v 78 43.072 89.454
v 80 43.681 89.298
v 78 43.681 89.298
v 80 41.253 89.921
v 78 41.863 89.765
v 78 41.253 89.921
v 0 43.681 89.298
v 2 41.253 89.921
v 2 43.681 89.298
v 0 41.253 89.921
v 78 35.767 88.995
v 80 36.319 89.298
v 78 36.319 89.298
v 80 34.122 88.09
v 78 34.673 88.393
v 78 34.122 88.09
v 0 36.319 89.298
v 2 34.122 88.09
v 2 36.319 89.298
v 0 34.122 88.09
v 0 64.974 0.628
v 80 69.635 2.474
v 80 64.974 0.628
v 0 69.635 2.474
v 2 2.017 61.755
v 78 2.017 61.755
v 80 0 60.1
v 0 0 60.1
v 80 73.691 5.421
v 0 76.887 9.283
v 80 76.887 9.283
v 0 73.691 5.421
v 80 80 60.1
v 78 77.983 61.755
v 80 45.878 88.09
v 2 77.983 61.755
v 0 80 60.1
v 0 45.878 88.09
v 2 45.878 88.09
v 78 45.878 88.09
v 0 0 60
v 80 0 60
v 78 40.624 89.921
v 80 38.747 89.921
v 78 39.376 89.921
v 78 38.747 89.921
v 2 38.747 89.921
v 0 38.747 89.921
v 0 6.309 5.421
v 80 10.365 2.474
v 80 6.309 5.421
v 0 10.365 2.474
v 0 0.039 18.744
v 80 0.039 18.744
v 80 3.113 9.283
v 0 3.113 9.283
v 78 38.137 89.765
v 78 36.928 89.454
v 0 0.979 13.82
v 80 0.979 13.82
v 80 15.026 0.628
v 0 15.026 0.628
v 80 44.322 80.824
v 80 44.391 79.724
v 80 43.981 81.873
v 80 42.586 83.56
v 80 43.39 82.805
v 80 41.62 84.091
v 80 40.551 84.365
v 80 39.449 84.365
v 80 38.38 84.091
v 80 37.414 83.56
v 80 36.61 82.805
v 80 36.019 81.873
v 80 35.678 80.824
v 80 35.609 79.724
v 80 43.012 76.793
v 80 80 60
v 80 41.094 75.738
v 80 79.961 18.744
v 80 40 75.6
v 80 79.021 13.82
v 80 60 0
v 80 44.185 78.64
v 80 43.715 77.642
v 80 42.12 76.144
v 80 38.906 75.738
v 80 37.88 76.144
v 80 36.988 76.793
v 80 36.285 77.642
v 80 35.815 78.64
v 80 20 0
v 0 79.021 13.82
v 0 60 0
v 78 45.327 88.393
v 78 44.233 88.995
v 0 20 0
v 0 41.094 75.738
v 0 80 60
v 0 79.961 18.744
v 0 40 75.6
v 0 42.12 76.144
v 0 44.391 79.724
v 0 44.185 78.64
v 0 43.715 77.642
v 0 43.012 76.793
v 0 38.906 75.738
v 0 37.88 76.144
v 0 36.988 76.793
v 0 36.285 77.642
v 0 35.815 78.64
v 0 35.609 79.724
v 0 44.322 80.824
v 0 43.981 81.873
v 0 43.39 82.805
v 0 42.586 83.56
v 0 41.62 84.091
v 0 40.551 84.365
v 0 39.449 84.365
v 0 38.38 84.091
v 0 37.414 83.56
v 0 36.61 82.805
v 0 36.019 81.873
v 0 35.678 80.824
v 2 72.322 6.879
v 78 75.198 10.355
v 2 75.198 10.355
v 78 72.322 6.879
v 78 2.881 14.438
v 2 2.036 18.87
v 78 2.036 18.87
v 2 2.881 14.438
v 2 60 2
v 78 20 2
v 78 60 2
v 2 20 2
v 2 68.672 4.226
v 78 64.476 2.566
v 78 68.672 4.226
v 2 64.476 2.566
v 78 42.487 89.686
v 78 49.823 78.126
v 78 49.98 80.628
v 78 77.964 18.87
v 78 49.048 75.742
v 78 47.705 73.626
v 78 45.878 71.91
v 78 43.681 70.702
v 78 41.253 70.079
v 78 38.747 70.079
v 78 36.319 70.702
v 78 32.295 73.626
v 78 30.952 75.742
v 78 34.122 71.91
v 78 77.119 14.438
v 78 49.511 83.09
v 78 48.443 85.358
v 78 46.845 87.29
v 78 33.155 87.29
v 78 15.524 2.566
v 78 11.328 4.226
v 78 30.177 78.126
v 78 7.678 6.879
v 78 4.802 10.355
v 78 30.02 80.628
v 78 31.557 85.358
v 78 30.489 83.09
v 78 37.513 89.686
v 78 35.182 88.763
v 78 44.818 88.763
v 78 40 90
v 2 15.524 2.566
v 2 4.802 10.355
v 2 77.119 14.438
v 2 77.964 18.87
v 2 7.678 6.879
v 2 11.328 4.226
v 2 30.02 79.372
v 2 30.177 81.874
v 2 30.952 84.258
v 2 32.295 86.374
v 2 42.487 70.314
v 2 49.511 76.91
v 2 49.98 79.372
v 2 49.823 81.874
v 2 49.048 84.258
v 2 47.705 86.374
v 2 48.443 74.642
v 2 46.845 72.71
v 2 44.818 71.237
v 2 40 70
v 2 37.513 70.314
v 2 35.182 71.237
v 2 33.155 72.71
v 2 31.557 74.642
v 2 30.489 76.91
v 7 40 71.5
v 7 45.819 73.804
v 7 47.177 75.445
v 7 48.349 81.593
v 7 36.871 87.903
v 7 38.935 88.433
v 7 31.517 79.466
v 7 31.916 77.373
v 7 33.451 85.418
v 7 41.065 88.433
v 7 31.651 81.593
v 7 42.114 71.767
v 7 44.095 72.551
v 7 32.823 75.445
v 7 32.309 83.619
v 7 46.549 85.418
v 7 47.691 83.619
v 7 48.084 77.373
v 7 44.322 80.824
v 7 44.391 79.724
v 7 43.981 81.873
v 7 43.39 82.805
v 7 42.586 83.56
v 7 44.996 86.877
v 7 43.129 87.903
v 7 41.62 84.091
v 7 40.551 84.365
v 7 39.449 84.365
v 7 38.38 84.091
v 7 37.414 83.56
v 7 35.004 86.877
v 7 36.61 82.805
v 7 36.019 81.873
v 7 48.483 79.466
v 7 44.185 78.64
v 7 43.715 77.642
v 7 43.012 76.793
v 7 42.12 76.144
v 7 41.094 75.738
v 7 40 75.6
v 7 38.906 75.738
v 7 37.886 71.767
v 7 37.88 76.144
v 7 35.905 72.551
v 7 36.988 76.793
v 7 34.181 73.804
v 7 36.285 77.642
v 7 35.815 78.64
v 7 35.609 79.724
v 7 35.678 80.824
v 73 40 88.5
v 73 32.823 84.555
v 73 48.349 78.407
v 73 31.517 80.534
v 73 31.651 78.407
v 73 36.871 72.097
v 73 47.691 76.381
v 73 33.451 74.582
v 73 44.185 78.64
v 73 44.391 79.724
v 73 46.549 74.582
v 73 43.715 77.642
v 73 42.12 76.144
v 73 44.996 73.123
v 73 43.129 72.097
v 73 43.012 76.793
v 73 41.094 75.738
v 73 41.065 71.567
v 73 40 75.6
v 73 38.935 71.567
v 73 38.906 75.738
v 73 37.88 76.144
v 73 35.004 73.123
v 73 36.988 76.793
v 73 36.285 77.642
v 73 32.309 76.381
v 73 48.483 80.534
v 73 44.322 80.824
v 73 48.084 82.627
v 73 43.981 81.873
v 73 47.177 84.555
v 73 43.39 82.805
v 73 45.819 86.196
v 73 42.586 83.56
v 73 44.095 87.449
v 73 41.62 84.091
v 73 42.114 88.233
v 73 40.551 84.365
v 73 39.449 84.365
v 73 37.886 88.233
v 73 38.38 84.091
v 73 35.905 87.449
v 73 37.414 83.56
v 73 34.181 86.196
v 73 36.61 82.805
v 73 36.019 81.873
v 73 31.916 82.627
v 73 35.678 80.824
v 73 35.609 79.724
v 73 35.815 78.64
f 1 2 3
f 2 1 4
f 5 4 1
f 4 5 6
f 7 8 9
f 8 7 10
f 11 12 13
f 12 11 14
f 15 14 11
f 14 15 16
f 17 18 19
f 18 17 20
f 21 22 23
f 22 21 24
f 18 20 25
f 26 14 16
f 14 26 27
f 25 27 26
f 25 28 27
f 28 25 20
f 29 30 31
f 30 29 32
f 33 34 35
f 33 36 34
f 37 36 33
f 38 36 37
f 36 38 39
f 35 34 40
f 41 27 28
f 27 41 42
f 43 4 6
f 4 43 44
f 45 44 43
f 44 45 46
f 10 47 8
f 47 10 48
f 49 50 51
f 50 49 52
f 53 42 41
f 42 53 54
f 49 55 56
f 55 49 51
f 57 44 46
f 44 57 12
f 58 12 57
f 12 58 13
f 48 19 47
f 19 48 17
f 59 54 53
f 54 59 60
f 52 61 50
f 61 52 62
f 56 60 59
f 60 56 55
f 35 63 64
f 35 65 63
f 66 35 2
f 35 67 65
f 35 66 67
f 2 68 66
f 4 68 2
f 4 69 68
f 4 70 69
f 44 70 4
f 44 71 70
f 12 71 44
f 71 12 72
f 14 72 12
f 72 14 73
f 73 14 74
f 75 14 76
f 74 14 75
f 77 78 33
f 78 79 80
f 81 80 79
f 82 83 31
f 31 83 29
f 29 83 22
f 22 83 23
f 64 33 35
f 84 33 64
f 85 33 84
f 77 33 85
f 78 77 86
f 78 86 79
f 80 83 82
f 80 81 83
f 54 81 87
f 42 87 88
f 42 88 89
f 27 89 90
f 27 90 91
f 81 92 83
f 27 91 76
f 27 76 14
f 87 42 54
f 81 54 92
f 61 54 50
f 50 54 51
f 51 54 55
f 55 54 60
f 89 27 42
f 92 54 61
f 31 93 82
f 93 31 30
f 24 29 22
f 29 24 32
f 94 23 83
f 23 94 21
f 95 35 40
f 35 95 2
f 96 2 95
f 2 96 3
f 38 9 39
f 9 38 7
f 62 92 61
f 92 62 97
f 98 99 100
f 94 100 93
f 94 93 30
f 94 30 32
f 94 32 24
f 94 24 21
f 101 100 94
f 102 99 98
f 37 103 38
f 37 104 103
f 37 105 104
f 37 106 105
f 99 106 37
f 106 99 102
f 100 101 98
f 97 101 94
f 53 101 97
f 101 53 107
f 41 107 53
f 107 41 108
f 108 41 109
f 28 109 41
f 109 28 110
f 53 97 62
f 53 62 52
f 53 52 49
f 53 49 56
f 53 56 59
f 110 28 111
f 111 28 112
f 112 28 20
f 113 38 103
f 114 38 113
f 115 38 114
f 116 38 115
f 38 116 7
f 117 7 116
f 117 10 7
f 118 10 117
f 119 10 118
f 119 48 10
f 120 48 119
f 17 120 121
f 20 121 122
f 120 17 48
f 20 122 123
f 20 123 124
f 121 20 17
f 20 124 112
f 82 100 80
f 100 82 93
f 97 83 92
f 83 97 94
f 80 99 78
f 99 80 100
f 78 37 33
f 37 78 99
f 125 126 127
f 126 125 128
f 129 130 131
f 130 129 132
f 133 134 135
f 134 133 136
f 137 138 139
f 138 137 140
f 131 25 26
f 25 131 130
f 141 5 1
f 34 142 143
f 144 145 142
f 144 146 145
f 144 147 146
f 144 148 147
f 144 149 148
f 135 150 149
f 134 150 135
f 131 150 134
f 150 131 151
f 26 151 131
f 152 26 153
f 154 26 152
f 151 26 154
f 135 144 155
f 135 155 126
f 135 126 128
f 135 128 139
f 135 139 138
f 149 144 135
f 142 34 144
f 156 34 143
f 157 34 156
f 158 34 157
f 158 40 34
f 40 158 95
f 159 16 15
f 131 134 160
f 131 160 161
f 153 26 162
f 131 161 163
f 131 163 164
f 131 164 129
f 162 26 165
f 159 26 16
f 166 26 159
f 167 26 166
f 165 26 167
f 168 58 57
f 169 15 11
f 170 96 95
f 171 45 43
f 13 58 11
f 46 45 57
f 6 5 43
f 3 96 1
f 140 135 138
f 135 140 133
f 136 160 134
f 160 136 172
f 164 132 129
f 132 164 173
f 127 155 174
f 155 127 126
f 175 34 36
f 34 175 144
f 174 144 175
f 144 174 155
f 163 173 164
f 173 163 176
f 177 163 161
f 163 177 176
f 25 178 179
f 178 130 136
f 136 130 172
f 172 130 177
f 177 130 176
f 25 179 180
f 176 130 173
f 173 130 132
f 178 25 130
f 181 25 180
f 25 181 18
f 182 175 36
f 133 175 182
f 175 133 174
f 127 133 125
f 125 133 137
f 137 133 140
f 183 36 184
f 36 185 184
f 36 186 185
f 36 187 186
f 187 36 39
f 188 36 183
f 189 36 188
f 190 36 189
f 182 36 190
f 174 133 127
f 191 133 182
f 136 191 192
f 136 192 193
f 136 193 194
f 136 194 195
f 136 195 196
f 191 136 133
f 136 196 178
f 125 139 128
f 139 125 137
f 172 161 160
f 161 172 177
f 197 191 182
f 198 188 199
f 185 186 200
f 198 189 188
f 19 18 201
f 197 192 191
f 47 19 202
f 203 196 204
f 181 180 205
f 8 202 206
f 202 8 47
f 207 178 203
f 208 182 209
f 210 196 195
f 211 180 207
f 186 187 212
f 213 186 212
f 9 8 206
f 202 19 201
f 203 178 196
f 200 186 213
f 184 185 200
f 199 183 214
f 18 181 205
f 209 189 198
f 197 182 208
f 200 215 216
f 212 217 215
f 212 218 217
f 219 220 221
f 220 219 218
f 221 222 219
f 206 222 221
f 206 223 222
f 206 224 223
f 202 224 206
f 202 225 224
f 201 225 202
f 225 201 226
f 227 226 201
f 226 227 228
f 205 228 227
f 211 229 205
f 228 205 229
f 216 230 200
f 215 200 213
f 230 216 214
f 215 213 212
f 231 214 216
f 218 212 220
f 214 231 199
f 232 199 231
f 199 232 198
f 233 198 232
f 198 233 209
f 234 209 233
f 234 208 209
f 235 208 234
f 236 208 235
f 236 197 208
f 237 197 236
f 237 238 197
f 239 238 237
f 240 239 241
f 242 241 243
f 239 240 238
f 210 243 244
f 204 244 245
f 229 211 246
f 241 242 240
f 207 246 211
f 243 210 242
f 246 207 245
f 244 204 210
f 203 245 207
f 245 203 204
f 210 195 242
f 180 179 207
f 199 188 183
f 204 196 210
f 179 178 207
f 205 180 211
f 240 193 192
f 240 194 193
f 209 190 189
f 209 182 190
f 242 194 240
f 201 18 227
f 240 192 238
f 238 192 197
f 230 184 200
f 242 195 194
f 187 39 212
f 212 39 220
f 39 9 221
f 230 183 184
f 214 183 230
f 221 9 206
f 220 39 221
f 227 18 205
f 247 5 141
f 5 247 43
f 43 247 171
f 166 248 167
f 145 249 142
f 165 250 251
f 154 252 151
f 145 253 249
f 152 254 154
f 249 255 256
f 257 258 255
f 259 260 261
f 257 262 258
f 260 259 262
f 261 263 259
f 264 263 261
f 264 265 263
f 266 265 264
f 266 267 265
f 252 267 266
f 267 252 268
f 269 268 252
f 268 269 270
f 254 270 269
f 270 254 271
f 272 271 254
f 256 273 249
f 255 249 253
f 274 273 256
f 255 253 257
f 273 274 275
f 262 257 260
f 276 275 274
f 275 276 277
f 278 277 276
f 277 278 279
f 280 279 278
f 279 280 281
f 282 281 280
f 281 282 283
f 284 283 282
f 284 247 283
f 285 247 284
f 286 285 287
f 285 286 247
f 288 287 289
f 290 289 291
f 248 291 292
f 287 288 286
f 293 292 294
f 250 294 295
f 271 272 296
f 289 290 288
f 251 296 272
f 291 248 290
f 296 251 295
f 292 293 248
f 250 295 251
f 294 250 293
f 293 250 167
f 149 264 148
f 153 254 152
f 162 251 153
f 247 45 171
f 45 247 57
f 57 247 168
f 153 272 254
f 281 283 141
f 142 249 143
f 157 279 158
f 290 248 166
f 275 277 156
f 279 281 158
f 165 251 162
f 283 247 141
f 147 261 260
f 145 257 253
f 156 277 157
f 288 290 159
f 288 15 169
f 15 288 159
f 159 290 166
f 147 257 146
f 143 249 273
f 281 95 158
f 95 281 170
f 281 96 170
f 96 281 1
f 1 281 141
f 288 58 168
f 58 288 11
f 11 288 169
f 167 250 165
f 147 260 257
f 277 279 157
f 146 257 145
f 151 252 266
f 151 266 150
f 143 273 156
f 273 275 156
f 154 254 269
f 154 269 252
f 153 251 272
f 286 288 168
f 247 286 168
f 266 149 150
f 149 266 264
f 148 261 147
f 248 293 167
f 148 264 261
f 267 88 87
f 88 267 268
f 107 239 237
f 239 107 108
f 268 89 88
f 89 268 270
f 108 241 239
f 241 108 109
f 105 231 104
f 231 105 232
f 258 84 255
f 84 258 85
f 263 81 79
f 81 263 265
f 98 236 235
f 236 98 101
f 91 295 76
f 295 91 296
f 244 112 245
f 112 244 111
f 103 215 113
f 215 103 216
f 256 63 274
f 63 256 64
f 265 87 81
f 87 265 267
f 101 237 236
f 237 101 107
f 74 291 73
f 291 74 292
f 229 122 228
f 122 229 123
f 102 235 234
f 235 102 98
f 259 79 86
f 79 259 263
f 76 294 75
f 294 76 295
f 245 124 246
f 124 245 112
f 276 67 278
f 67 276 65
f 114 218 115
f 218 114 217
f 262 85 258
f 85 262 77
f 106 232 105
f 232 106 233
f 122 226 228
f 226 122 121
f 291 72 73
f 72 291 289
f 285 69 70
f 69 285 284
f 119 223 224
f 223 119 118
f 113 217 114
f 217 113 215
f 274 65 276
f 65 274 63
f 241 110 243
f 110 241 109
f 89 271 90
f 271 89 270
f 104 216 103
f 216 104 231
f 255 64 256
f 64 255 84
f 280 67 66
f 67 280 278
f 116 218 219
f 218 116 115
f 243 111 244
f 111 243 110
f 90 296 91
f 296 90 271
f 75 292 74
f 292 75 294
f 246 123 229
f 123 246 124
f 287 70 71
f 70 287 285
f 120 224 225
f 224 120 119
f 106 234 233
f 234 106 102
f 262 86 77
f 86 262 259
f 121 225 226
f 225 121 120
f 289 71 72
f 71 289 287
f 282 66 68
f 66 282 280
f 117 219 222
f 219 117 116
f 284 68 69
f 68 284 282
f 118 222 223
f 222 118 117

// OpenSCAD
$fn = 25;
radius = 20;
width = 80; //x
length = 80; //y
h_pivot = 80;
h_tub = 60;
od_pivot = 20;
face_dia = 17;
h_boss = 5;
hole_dia = 8.8;
thk = 2;

mid_clevis_width = width-2*thk-2*h_boss;

echo("Width between bosses: ", mid_clevis_width);

difference()
{
union()
{
difference()
{
//outer hull
    hull()
    {
        translate([0,radius,radius]) rotate([0,90,0]) cylinder(r=radius,h=width);

        translate([0,length-radius,radius]) rotate([0,90,0]) cylinder(r=radius,h=width);

        translate([0,0,h_tub]) cube([width,length,0.1]);

        translate([0,length/2,h_pivot]) rotate([0,90,0]) cylinder(d=od_pivot,h=width);
    }

    //inner cutout
    hull()
    {
        i_rad = radius - thk;
        i_width = width - 2*thk;
        i_length = length - 2*thk;
        translate([thk,thk,thk])
        {
        translate([0,i_rad,i_rad]) rotate([0,90,0]) cylinder(r=i_rad,h=i_width);

        translate([0,i_length-i_rad,i_rad]) rotate([0,90,0]) cylinder(r=i_rad,h=i_width);

        translate([0,0,h_pivot+od_pivot]) cube([i_width,i_length,0.1]);
        }
    }
}

    translate([thk,length/2,h_pivot]) rotate([0,90,0]) cylinder(d1=od_pivot,d2=face_dia,h=h_boss);
    translate([width-thk,length/2,h_pivot]) rotate([0,-90,0]) cylinder(d1=od_pivot,d2=face_dia,h=h_boss);
}    
translate([0,length/2,h_pivot]) rotate([0,90,0]) cylinder(d=hole_dia,h=width);
}
